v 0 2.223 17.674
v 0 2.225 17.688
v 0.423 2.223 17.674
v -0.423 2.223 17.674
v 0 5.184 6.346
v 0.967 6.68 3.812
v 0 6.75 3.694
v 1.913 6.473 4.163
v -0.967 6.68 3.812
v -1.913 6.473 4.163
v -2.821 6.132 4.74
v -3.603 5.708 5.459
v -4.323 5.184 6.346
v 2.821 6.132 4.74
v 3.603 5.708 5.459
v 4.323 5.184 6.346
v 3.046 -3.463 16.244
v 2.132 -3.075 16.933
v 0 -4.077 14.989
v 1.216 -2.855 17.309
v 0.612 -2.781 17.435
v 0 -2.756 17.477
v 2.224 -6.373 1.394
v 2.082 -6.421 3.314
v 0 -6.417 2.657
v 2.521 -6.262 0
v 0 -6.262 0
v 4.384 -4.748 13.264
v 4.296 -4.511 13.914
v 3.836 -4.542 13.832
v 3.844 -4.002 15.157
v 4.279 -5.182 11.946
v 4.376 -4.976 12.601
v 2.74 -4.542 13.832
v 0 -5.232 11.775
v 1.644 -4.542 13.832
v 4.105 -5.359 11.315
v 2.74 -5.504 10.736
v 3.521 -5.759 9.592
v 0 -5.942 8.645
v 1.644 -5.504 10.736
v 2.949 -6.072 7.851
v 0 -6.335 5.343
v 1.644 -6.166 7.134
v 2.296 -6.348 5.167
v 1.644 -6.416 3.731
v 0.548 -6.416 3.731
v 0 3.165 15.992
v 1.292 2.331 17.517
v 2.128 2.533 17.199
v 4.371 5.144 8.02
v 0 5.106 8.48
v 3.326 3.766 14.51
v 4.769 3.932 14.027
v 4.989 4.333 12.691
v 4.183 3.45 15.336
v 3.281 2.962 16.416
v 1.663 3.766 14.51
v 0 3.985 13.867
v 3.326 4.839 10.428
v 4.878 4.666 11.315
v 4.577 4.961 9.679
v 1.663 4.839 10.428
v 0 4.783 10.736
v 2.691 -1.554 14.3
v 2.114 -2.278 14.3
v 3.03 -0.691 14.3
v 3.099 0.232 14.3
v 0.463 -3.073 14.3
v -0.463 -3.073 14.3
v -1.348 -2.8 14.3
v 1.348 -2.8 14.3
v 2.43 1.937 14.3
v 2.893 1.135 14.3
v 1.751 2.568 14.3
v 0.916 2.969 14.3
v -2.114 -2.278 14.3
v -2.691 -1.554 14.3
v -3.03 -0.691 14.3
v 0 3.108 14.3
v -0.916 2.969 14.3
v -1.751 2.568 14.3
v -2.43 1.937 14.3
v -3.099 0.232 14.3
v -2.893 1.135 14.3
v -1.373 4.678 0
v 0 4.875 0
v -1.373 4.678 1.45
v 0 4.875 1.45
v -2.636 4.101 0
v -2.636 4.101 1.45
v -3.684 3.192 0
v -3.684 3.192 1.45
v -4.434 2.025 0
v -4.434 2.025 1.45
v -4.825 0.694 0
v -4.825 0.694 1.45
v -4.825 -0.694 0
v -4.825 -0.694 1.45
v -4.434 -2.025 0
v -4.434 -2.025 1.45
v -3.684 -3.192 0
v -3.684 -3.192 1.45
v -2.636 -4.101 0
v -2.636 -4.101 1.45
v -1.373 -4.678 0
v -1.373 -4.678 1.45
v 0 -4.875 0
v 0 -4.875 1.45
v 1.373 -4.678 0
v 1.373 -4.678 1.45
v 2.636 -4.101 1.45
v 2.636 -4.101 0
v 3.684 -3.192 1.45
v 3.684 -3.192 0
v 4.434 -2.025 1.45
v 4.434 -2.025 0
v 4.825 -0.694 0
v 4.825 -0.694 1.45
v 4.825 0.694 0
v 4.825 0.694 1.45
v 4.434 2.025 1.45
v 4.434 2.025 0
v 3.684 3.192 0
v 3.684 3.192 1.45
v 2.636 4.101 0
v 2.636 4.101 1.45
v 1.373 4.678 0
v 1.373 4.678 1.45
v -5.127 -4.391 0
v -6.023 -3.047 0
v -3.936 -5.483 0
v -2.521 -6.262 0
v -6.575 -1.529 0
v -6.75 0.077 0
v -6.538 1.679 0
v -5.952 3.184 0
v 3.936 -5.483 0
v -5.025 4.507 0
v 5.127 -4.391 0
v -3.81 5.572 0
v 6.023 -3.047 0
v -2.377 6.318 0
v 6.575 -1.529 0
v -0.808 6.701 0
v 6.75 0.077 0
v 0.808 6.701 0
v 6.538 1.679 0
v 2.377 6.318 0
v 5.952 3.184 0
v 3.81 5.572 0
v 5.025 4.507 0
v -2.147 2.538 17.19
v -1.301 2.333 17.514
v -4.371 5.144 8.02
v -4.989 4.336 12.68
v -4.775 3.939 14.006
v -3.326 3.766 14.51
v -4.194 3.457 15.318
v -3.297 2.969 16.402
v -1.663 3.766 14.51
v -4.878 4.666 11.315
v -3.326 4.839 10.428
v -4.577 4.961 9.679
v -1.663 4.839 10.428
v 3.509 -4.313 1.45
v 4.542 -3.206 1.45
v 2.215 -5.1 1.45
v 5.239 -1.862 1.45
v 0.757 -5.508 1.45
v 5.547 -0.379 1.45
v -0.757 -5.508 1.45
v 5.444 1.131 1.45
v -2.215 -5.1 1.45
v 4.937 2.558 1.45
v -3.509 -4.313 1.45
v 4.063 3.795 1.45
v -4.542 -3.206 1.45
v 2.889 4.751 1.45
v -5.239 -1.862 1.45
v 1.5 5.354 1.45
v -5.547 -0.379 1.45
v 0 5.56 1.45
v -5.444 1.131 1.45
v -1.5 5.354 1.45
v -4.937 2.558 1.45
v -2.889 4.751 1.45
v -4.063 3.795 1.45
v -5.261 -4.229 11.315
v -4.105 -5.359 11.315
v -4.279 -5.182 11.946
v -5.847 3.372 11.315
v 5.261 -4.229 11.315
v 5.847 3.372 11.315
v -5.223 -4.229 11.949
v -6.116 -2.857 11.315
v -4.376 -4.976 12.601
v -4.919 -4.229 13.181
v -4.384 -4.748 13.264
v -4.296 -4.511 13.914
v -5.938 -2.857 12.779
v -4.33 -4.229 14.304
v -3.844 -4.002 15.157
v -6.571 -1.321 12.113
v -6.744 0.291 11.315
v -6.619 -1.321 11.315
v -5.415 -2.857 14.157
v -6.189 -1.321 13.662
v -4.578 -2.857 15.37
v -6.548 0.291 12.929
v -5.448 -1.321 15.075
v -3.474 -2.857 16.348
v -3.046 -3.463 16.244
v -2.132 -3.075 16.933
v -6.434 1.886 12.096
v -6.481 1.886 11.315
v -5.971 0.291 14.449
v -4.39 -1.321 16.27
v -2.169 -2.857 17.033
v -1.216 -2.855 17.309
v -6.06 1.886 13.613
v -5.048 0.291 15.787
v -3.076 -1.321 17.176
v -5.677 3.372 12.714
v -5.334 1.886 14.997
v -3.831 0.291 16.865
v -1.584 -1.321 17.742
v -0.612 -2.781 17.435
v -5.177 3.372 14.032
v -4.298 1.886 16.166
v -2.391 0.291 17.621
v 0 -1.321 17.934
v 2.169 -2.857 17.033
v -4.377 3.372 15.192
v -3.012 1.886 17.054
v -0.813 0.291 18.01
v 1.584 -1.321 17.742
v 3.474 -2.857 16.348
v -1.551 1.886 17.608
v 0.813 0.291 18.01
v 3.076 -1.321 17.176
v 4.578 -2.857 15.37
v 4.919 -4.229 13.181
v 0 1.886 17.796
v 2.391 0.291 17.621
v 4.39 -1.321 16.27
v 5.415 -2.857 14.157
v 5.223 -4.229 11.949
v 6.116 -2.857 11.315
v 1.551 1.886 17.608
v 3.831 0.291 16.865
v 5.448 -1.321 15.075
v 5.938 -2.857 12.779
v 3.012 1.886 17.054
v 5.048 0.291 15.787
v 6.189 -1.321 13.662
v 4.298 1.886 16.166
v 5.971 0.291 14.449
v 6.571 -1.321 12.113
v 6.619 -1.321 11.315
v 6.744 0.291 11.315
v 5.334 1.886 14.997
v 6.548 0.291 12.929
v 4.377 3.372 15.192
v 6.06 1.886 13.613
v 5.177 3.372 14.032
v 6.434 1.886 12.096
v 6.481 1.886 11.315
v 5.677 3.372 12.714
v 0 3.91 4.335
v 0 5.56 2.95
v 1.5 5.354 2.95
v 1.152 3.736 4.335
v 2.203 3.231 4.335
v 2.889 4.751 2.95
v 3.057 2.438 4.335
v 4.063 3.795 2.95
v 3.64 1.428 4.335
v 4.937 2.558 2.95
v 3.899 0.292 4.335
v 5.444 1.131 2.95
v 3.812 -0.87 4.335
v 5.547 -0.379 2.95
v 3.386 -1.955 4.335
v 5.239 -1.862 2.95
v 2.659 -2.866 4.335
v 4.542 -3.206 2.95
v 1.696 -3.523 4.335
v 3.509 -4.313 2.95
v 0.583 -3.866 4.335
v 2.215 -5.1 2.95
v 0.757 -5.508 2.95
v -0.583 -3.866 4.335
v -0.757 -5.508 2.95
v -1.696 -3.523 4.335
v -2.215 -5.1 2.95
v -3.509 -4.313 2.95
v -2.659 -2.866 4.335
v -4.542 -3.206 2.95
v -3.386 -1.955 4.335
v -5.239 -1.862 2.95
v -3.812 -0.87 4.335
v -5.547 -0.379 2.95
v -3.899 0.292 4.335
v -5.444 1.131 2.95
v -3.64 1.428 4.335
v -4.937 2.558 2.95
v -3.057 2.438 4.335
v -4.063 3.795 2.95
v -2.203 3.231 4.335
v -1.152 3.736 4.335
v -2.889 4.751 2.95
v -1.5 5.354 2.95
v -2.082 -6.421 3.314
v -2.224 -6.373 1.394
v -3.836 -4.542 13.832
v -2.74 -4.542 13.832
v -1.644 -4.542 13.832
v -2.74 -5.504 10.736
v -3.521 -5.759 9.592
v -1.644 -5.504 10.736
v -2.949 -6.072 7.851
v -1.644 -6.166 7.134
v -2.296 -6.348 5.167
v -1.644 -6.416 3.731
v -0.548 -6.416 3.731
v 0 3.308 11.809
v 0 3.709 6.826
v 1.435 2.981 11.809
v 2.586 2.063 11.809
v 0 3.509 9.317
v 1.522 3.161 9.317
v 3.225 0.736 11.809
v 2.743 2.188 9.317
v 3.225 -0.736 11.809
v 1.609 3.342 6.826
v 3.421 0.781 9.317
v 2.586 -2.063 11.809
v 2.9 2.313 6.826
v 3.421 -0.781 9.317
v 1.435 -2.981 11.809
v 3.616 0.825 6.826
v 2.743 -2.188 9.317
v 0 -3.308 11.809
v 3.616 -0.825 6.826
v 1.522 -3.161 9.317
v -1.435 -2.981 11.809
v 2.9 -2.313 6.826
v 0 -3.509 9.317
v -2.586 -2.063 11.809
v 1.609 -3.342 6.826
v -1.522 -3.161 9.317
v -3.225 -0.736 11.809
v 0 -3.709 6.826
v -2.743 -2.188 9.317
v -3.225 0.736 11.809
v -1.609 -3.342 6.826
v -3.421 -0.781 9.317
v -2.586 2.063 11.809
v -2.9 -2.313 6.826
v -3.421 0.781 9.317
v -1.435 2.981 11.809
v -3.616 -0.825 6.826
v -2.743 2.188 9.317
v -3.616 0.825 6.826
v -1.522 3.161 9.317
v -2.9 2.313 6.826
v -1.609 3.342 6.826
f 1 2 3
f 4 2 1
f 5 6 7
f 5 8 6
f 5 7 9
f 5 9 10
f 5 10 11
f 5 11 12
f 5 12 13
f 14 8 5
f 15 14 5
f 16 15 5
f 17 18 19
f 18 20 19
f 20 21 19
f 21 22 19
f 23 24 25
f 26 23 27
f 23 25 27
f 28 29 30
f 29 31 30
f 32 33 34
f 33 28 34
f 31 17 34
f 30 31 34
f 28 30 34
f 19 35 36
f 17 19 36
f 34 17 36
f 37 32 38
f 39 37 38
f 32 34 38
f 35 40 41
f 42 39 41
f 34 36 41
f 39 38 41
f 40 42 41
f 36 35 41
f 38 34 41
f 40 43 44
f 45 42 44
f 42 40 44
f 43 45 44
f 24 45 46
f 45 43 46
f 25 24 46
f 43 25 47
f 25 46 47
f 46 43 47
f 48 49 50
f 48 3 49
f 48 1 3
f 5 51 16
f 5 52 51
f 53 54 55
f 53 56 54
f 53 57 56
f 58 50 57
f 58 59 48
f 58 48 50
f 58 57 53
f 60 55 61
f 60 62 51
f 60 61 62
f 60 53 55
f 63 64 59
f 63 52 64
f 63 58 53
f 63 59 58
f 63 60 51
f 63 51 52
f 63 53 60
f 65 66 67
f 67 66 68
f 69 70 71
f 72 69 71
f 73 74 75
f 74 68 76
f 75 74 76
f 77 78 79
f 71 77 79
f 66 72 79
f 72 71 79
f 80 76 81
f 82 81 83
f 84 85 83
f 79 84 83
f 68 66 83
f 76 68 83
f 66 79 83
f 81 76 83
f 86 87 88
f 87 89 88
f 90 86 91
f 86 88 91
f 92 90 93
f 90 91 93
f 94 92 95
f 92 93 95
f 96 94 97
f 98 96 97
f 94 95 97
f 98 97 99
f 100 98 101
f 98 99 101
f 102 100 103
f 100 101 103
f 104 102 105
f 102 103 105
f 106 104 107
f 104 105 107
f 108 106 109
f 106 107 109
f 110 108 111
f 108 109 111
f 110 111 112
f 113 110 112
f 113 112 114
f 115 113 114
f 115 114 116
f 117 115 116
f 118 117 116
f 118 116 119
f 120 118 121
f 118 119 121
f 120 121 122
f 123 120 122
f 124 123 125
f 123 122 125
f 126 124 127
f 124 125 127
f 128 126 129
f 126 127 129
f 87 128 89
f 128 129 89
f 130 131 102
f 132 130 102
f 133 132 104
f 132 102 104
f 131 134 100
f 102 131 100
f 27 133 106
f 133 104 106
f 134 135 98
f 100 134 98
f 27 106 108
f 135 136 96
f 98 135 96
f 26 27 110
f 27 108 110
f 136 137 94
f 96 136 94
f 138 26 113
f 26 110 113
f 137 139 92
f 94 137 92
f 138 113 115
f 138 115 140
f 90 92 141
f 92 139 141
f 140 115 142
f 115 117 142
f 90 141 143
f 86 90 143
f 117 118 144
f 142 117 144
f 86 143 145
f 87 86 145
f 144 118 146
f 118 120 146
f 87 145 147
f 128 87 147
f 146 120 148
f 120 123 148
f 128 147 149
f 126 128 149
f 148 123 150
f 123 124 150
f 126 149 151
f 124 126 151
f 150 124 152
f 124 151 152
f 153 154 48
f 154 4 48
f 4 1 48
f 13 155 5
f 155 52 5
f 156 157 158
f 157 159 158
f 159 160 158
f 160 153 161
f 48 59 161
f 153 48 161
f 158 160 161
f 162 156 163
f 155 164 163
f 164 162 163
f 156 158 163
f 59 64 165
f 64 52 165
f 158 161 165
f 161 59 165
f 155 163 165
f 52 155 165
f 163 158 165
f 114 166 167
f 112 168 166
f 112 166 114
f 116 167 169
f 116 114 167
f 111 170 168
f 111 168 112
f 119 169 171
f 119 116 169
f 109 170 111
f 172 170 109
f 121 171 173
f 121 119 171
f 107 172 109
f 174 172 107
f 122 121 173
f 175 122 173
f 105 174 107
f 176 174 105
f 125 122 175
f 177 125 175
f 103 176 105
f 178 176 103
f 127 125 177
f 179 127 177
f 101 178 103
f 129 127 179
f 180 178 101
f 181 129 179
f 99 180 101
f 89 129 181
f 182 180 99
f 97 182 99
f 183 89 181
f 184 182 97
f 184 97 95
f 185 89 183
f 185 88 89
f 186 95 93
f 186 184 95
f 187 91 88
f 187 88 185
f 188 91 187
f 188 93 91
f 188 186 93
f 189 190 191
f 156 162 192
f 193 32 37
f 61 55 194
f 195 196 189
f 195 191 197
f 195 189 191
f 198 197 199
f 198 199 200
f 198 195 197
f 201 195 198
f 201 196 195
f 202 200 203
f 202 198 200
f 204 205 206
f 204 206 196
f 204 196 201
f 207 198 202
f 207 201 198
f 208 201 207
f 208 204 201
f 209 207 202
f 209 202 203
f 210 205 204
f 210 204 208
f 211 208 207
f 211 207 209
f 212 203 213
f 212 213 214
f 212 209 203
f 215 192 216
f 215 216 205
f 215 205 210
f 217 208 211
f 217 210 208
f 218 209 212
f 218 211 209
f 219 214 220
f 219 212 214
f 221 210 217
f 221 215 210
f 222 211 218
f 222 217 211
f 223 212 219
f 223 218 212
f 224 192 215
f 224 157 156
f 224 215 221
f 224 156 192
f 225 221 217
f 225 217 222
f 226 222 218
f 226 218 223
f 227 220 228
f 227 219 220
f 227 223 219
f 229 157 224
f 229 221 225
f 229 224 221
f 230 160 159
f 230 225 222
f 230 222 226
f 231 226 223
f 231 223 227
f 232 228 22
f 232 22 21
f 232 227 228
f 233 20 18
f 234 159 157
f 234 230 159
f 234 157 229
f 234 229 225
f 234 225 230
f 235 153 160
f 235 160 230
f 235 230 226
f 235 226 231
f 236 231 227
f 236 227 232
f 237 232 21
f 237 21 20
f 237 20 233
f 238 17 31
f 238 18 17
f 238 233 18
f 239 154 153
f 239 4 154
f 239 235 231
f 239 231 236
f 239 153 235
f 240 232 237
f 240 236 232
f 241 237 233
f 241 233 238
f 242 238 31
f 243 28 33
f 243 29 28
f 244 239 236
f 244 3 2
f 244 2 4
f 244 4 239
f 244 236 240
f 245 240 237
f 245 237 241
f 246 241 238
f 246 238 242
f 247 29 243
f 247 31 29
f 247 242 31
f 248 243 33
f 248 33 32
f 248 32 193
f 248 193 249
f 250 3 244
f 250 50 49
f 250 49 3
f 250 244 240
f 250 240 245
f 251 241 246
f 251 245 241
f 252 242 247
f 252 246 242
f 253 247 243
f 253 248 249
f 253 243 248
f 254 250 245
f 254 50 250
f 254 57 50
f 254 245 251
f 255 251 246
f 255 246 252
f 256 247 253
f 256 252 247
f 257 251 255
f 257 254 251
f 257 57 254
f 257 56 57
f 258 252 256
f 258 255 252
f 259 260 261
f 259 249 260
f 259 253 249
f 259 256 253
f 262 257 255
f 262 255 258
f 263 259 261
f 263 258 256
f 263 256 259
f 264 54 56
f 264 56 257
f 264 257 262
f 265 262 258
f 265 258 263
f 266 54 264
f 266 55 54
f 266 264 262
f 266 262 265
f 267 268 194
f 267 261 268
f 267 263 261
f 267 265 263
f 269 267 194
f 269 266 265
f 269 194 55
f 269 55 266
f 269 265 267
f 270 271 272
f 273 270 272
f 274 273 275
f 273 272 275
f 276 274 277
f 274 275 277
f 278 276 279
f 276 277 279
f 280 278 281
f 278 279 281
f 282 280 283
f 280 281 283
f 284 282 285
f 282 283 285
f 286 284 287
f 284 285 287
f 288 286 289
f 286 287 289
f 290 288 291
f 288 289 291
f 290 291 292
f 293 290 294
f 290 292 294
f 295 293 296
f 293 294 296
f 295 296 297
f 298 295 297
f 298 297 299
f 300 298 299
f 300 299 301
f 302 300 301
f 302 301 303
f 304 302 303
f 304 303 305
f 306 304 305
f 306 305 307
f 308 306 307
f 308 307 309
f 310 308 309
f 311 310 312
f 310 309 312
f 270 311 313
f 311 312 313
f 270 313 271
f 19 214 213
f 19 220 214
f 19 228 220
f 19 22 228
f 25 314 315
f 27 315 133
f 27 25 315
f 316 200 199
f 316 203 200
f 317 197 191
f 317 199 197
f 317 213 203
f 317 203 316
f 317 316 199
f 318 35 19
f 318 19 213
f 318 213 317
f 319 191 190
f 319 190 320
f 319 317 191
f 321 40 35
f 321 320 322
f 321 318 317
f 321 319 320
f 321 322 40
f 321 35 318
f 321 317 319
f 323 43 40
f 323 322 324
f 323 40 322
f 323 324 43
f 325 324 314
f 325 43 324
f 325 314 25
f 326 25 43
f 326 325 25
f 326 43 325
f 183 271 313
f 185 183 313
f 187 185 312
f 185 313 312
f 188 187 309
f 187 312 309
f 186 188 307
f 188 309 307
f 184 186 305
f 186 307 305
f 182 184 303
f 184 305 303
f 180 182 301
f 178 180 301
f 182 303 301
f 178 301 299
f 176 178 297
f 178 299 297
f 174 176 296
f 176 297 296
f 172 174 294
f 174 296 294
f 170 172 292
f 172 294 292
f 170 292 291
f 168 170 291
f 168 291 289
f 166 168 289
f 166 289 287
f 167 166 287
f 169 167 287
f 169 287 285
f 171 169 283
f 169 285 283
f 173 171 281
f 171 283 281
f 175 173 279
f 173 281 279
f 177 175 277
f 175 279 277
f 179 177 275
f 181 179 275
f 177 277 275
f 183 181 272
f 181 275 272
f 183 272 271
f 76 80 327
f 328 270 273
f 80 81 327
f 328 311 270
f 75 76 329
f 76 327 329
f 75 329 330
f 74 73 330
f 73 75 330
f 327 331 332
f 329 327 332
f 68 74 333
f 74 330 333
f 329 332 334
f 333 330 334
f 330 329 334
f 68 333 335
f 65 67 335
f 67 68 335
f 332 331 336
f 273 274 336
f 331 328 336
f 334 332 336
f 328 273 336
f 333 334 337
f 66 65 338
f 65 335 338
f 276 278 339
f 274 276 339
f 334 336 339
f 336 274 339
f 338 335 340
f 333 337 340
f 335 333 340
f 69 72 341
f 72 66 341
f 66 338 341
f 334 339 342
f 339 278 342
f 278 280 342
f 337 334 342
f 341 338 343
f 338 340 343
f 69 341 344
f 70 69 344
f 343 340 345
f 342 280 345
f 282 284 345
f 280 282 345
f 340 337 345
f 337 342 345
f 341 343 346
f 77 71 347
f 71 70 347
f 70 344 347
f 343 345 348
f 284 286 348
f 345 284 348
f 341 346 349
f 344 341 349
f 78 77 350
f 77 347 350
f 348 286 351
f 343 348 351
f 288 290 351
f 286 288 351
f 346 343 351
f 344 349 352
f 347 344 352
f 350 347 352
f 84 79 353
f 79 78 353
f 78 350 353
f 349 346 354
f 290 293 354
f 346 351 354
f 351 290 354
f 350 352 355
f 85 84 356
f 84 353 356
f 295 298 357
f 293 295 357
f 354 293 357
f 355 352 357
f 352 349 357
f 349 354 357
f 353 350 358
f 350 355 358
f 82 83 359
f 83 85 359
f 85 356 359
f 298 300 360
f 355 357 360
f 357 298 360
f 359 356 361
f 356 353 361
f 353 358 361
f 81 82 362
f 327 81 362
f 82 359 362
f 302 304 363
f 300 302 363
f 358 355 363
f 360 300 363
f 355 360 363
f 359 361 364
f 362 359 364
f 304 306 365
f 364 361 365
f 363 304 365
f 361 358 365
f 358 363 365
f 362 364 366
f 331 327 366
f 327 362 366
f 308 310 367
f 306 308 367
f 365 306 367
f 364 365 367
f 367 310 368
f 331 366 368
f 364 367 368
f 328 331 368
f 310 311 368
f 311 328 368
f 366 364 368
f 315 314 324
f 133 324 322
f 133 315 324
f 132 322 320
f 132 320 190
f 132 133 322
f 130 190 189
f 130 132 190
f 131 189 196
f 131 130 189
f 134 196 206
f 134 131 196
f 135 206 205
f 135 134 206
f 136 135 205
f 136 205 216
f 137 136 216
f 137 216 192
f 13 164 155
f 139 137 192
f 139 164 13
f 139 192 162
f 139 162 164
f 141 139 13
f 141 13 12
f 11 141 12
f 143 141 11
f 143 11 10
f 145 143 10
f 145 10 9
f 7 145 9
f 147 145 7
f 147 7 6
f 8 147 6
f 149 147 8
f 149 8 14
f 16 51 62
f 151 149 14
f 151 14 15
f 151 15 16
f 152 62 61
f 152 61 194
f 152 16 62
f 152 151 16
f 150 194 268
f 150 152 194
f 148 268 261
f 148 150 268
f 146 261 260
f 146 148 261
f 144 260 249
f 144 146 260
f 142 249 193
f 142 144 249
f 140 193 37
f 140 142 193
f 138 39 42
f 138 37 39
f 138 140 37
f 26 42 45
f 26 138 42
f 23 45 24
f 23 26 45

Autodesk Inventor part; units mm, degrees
ref_plane "YZ Plane" through (0, 0, 0) normal (1, 0, 0) x (0, 1, 0)
ref_plane "XZ Plane" through (0, 0, 0) normal (0, 1, 0) x (-1, 0, 0)
ref_plane "XY Plane" through (0, 0, 0) normal (0, 0, 1) x (1, 0, 0)
sketch "Sketch1" plane through (0, 0, 0) normal (0, 0, 1) x (1, 0, 0)
  circle A0 centre (0, 0) radius 6.75
  dimension "d0" = 13.5
extrude "Extrusion1" add sketch "Sketch1" along normal blind 11.315
sketch "Sketch2" plane through (0, 0, 11.315) normal (0, 0, 1) x (1, 0, 0)
  arc A0 (0, -6.75) -> (0, 6.75) centre (0, 0) ccw
  line L0 (0, 6.75) -> (0, -6.75)
revolve "Revolution1" add sketch "Sketch2" angle 360 about axis through (0, 6.75, 11.315) along (0, -1, 0)
sketch "Sketch3" plane through (0, 0, 0) normal (1, 0, 0) x (0, 1, 0)
  line L0 (6.9939, 18.3652) -> (6.9939, -0.2867) construction
  line L1 (6.9939, -0.2867) -> (-6.6981, -0.2867) construction
  line L2 (-6.6981, -0.2867) -> (-6.6981, 18.3652) construction
  line L3 (-6.6981, 18.3652) -> (6.9939, 18.3652) construction
  line L4 (7.5187, 2.3916) -> (5.1843, 6.3459)
  spline S0 degree 3 poles (2.2232, 17.6743) (3.9137, 15.2739) (5.2905, 10.1216) (5.1843, 6.3459) knots 0 0 0 0 1 1 1 1
  spline S1 degree 4 poles (-2.7095, 17.5553) (-3.4345, 16.3323) (-3.9815, 15.3648) (-4.6404, 13.6169) (-5.2893, 11.6954) (-5.7416, 9.7633) (-6.0904, 7.9156) (-6.2555, 6.3812) (-6.4601, 3.9007) (-6.437, 2.3154) (-6.3311, 0.3242) (-6.2339, -0.1725) knots 0 0 0 0 0 0.226948 0.315631 0.407822 0.501079 0.595945 0.688744 0.781622 1 1 1 1 1
  arc A0 (2.2232, 17.6743) -> (-2.7095, 17.5553) centre (-0.2549, 18.1011) ccw
  line L5 (7.5187, 2.3916) -> (7.6074, -3.0566)
  line L6 (7.6074, -3.0566) -> (-6.5982, -2.034)
  line L7 (-6.5982, -2.034) -> (-6.1989, -0.3494)
  line L8 (-6.1989, -0.3494) -> (-6.2339, -0.1725)
  line L9 (-10.6943, 22.9274) -> (9.6594, 22.9274)
  line L10 (9.6594, 22.9274) -> (9.6594, -5.6031)
  line L11 (9.6594, -5.6031) -> (-10.6943, -5.6031)
  line L12 (-10.6943, -5.6031) -> (-10.6943, 22.9274)
  line L13 (-10.6943, 22.9274) -> (9.6594, -5.6031) construction
  line L14 (9.6594, 22.9274) -> (-10.6943, -5.6031) construction
  point P0 (0, 0)
  point P1 (3.606, 14.941)
  point P2 (4.8031, 10.6278)
  point P3 (-3.6969, 15.797)
  point P4 (-4.2759, 14.5167)
  point P5 (-4.7839, 13.1635)
  point P6 (-5.2449, 11.7299)
  point P7 (-5.7181, 9.7886)
  point P8 (-6.0639, 7.9039)
  point P9 (-6.252, 6.3205)
  point P10 (-6.3835, 4.5875)
  point P11 (-6.4199, 2.9071)
  point P12 (-6.3492, 0.98)
  point P13 (-0.5174, 8.6621)
extrude "Extrusion2" cut sketch "Sketch3" against normal mid plane 15.315
sketch "Sketch4" plane through (0, 0, 0) normal (1, 0, 0) x (0, 1, 0)
  line L0 (0, 0) -> (4.875, 0)
  line L1 (6.75, 0) -> (-6.2616, 0) projected
  line L2 (4.875, 0) -> (4.875, 1.45)
  line L3 (4.875, 1.45) -> (5.56, 1.45)
  line L4 (5.56, 1.45) -> (5.56, 2.95)
  line L5 (5.56, 2.95) -> (5.56, 4.2347)
  line L6 (3.91, 4.3347) -> (5.56, 2.95)
  line L7 (0, 0) -> (0, 14.3)
  line L8 (0, 14.3) -> (3.1075, 14.3)
  line L9 (3.1075, 14.3) -> (3.91, 4.3347)
  dimension "d57" = 4.875
  dimension "d58" = 1.45
  dimension "d59" = 0.685
  dimension "d60" = 1.5
  dimension "d61" = 1.2847
  dimension "d63" = 14.3
  dimension "d64" = 3.1075
revolve "Revolution2" cut sketch "Sketch4" angle 360 about axis through (0, 0, 0) along (0, 0, 1)
properties part number "TipTip"
